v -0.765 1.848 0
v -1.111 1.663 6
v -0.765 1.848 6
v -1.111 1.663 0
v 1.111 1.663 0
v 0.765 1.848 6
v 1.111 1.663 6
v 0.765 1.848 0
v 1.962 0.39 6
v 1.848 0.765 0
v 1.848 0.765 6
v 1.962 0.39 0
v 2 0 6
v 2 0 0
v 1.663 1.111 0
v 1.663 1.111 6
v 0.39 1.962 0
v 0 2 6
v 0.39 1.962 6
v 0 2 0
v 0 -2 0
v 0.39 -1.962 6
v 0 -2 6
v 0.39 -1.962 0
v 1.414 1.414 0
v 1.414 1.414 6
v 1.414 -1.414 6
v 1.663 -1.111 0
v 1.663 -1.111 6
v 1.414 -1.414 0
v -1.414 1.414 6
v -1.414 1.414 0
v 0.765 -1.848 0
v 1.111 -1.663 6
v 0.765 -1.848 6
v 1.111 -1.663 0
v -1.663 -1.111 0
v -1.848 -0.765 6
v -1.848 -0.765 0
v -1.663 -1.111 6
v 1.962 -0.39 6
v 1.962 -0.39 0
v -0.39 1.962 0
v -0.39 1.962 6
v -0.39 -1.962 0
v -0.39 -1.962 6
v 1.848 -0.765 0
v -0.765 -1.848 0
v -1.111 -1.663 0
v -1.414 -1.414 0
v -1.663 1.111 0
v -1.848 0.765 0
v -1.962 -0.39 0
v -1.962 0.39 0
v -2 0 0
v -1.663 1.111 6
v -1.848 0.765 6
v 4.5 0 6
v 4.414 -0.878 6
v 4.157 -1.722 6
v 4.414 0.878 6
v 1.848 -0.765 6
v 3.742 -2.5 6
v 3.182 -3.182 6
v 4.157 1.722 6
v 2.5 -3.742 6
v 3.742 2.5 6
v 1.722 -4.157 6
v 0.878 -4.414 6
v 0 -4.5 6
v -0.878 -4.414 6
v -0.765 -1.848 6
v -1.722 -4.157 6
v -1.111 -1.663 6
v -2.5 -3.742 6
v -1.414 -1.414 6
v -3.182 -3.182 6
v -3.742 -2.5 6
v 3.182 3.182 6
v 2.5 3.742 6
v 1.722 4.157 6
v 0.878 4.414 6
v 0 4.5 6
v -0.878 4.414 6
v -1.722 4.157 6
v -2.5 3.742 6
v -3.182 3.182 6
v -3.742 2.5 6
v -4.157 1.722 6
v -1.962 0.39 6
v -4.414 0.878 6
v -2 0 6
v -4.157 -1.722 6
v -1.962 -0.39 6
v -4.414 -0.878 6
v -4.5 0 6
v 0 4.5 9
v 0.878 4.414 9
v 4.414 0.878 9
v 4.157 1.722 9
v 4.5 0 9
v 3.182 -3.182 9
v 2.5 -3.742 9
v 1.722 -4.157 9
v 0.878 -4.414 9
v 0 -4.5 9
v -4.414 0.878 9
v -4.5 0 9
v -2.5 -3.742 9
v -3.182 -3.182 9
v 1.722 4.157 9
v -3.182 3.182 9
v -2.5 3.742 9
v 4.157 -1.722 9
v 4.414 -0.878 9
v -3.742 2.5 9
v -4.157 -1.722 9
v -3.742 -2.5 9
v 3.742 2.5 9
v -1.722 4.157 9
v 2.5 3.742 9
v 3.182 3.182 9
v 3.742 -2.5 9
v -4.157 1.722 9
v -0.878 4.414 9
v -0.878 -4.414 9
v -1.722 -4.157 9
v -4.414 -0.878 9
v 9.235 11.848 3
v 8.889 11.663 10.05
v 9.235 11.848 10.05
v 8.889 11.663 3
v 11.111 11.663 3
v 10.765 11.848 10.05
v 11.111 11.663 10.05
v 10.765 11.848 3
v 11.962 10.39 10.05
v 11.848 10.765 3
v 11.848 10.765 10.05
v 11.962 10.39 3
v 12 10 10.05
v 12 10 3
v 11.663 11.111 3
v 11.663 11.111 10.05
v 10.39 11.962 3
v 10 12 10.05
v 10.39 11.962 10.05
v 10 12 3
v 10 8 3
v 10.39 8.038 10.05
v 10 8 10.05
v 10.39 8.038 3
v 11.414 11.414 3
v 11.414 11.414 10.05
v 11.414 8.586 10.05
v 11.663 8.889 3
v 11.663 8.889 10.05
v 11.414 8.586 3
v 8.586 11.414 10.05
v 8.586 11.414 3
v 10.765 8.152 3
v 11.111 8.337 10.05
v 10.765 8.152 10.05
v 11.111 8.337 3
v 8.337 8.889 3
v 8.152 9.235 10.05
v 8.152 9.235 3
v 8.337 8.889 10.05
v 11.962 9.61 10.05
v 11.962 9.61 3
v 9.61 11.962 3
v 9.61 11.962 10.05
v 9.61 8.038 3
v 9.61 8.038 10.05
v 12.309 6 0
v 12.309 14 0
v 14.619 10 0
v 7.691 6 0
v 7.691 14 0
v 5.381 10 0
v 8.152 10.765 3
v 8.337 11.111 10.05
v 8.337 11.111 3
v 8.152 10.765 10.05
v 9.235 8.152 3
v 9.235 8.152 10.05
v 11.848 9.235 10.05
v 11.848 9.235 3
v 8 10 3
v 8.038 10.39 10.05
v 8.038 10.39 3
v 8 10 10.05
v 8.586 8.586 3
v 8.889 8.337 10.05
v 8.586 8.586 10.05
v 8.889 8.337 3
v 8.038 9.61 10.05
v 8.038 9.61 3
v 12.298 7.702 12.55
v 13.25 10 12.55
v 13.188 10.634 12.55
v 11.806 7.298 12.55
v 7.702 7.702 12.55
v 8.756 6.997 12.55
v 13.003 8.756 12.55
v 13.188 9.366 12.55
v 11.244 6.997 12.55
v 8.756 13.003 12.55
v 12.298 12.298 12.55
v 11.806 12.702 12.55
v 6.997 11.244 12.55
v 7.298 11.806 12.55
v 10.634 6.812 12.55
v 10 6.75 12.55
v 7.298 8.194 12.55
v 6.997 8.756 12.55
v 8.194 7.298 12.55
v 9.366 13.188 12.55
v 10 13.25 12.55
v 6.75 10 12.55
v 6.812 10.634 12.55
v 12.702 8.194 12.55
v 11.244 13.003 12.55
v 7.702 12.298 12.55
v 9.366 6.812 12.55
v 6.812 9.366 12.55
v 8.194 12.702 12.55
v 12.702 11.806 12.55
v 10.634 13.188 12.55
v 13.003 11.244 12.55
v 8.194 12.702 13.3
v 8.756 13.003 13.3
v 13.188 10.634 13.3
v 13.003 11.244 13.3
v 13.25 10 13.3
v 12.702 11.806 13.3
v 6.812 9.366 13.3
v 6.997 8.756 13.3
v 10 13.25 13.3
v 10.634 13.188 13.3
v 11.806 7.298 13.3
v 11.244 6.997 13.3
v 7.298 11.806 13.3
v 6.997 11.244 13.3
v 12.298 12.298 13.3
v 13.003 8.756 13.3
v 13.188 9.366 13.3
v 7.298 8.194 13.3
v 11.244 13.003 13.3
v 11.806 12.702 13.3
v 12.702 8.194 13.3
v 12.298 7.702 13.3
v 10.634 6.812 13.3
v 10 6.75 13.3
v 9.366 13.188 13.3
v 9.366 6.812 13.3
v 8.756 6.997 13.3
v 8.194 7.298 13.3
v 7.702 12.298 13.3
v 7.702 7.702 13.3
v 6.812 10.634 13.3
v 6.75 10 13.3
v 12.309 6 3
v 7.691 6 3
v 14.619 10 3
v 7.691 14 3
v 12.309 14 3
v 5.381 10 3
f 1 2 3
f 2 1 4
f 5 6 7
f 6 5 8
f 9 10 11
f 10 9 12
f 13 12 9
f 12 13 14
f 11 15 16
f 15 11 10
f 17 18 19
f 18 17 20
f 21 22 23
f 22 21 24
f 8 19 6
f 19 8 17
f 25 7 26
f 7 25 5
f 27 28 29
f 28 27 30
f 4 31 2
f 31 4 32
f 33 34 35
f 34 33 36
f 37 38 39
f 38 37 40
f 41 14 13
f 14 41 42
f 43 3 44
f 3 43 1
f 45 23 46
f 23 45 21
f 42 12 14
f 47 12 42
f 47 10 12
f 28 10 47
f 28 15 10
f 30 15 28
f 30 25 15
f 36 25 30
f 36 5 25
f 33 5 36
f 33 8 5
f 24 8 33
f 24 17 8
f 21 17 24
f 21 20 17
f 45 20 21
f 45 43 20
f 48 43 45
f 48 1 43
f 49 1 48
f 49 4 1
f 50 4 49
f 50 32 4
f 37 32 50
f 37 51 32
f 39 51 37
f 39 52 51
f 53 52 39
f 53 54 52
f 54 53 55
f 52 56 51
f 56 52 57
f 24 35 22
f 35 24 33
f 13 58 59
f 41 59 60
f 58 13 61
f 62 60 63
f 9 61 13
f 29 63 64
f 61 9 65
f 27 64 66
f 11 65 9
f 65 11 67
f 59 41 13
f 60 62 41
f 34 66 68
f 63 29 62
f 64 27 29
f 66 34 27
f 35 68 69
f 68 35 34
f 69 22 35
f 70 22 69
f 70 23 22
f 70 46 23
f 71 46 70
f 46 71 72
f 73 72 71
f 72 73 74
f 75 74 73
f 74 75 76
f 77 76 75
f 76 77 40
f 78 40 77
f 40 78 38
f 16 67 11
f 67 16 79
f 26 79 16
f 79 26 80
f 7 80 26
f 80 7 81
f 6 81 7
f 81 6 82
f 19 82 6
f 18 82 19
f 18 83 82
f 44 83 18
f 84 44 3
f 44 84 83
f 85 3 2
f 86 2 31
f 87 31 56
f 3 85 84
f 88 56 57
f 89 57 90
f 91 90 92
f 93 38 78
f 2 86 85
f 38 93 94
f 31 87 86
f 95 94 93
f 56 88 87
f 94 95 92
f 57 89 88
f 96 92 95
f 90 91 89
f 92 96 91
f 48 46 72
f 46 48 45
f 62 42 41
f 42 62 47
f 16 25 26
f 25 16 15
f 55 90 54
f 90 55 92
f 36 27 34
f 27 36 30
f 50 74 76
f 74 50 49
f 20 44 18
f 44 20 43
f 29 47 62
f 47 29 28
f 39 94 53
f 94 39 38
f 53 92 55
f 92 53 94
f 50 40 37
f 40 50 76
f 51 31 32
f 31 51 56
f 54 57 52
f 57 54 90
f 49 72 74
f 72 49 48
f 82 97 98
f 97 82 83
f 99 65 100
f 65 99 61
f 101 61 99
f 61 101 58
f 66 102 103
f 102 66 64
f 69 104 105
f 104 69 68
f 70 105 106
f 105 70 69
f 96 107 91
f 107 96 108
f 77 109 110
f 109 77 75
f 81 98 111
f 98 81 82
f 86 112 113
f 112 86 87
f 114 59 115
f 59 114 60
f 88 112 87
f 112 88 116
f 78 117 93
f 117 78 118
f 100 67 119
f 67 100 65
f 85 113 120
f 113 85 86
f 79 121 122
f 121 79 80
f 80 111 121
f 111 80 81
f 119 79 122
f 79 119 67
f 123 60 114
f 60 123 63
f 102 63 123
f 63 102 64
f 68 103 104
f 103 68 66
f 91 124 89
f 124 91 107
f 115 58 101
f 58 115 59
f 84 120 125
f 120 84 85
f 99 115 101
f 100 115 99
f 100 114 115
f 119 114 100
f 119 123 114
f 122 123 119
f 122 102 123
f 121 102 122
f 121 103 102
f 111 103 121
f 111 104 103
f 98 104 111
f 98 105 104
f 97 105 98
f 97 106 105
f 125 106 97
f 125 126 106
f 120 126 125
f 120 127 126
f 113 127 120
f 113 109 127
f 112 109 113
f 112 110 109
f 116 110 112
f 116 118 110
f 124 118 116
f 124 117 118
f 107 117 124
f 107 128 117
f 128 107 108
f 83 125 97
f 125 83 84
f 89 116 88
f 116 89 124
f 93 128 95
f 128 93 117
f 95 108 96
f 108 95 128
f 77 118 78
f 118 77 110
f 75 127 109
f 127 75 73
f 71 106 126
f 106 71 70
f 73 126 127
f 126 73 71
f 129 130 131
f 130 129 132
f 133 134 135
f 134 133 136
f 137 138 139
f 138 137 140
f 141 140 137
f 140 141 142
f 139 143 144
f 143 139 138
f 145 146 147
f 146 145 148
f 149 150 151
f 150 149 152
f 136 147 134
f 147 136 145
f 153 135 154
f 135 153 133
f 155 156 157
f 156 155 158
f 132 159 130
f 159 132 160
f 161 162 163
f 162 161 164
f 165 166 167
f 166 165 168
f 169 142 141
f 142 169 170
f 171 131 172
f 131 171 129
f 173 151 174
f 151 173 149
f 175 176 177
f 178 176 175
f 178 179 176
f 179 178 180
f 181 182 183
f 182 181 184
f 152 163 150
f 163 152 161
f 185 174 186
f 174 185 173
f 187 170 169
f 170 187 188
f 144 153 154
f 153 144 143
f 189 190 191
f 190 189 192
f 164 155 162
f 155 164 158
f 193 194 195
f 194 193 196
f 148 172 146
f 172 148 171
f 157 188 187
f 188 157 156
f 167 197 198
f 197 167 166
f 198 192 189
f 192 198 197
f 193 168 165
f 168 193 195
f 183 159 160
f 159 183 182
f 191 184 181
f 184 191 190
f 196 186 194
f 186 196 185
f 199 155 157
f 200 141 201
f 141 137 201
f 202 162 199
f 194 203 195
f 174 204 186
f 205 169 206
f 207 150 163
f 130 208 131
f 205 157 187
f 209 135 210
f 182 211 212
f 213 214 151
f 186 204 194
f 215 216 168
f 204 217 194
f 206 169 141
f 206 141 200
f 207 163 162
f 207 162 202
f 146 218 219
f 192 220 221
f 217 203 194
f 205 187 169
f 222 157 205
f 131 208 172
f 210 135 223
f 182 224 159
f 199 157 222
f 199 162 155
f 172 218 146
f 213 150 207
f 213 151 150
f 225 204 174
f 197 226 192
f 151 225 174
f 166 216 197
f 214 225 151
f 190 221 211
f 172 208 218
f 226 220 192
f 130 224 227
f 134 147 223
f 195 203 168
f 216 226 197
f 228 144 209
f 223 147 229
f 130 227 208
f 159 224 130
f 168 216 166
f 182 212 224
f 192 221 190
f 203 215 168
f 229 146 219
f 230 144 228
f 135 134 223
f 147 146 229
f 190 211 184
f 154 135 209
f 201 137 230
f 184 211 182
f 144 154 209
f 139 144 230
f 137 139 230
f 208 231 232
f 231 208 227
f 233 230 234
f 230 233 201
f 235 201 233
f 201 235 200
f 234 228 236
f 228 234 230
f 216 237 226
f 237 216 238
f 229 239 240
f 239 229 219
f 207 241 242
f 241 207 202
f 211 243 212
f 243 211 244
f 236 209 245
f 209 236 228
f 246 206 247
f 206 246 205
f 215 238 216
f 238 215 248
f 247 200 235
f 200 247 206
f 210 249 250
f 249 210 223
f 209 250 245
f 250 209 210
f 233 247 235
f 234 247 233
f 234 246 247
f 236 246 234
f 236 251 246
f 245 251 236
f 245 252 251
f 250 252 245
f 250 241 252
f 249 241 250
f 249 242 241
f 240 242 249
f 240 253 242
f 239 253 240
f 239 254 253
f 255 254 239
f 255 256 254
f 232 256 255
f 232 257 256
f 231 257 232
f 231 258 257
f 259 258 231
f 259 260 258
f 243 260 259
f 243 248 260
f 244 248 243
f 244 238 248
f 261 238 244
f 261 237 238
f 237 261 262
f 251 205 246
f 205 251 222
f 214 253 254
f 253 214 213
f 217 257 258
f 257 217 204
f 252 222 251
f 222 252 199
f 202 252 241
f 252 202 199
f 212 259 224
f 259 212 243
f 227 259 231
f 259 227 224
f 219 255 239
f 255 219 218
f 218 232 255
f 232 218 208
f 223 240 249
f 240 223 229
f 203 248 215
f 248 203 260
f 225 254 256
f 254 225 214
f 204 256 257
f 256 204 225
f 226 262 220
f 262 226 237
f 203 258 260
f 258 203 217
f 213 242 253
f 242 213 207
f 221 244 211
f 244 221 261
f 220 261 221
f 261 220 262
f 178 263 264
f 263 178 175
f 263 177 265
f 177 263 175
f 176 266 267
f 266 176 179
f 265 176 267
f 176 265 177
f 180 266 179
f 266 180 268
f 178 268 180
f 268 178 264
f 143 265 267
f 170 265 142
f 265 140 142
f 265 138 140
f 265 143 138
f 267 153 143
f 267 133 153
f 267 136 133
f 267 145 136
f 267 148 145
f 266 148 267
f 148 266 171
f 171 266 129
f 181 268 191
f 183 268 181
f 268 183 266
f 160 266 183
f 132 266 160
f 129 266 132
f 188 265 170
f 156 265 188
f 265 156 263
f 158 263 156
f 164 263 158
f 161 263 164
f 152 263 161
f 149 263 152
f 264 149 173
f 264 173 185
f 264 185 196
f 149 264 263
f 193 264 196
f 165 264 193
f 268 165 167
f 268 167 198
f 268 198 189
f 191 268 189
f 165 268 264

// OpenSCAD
function dHex(e2e) = e2e / sin(60);
function rHex(e2e) = dHex(e2e) / 2;

module Hex(e2e, h) {
  cylinder(d = dHex(e2e), h = h, $fn = 6);
}

function dThread(std) =
  std == "6-32" ? 4 :
  // If it's not found, it is metric already.
  // Add 1/2mm tolerance so it doesn't bind.
  std + 0.5;

function rThread(std) = dThread(std) / 2;

// Thread diameter
// Thread length
// Thread padding
// Head diameter
// Head length
// Head padding
module ScrewStraightHead(td, tl, tp, hd, hl, hp) {
  translate([0, 0, -tp]) cylinder(d = td, h = tl + tp);
  translate([0, 0,  tl]) cylinder(d = hd, h = hl + hp);
}

// Thread diameter
// Thread length
// Thread padding
// Head diameter
// Head length 1: Length of chamfer.
// Head length 2: Length of head above chamfer edge.
// Head padding
module ScrewChamferHead(td, tl, tp, hd, hl1, hl2, hp) {
  translate([0, 0, -tp      ]) cylinder(d  = td,          h = tl + tp);
  translate([0, 0,  tl      ]) cylinder(d1 = td, d2 = hd, h = hl1);
  translate([0, 0,  tl + hl1]) cylinder(d  = hd,          h = hl2 + hp);
}

// Must provide either
// screw_l && head_l && head_d
// screw_l && thread_l && head_d
// screw_l && head_l1 && head_l2 && head_d1 && head_d2
// screw_l && thread_l && head_d
// thread_l && head_l && head_d
// thread_l && head_l1 && head_l2 && head_d1 && head_d2
module Screw(
  std,
  screw_l = undef,
  thread_l = undef,
  thread_padding = 0,
  head_l = undef,
  head_d = undef,
  head_l1 = undef,
  head_l2 = undef,
  head_padding = 0,
) {
  if (head_l1 && head_l2) {
    ScrewChamferHead(
      dThread(std),
      thread_l ? thread_l : screw_l - head_l1 - head_l2,
      thread_padding,
      head_d,
      head_l1,
      head_l2,
      head_padding
    );
  } else {
    ScrewStraightHead(
      dThread(std),
      thread_l ? thread_l : screw_l - head_l,
      thread_padding,
      head_d,
      head_l,
      head_padding
    );
  }
}

module CaseScrew(thread_padding = 0, head_padding = 0) {
  Screw(
    "6-32",
    screw_l = 9,
    head_l = 3,
    head_d = 9
  );
}

CaseScrew(0, 0, $fn = 32);

module HillmanNut() {
  Hex(8, 3);
}

module HillmanScrew(thread_padding = 0, head_padding = 0) {
  Screw(
    "6-32",
    screw_l = 13.3,
    head_l1 = 2.5,
    head_l2 = 0.75,
    head_d = 6.5
  );
}

translate([10, 10]) {
  HillmanScrew(0, 0, $fn = 32);
  HillmanNut();
}
